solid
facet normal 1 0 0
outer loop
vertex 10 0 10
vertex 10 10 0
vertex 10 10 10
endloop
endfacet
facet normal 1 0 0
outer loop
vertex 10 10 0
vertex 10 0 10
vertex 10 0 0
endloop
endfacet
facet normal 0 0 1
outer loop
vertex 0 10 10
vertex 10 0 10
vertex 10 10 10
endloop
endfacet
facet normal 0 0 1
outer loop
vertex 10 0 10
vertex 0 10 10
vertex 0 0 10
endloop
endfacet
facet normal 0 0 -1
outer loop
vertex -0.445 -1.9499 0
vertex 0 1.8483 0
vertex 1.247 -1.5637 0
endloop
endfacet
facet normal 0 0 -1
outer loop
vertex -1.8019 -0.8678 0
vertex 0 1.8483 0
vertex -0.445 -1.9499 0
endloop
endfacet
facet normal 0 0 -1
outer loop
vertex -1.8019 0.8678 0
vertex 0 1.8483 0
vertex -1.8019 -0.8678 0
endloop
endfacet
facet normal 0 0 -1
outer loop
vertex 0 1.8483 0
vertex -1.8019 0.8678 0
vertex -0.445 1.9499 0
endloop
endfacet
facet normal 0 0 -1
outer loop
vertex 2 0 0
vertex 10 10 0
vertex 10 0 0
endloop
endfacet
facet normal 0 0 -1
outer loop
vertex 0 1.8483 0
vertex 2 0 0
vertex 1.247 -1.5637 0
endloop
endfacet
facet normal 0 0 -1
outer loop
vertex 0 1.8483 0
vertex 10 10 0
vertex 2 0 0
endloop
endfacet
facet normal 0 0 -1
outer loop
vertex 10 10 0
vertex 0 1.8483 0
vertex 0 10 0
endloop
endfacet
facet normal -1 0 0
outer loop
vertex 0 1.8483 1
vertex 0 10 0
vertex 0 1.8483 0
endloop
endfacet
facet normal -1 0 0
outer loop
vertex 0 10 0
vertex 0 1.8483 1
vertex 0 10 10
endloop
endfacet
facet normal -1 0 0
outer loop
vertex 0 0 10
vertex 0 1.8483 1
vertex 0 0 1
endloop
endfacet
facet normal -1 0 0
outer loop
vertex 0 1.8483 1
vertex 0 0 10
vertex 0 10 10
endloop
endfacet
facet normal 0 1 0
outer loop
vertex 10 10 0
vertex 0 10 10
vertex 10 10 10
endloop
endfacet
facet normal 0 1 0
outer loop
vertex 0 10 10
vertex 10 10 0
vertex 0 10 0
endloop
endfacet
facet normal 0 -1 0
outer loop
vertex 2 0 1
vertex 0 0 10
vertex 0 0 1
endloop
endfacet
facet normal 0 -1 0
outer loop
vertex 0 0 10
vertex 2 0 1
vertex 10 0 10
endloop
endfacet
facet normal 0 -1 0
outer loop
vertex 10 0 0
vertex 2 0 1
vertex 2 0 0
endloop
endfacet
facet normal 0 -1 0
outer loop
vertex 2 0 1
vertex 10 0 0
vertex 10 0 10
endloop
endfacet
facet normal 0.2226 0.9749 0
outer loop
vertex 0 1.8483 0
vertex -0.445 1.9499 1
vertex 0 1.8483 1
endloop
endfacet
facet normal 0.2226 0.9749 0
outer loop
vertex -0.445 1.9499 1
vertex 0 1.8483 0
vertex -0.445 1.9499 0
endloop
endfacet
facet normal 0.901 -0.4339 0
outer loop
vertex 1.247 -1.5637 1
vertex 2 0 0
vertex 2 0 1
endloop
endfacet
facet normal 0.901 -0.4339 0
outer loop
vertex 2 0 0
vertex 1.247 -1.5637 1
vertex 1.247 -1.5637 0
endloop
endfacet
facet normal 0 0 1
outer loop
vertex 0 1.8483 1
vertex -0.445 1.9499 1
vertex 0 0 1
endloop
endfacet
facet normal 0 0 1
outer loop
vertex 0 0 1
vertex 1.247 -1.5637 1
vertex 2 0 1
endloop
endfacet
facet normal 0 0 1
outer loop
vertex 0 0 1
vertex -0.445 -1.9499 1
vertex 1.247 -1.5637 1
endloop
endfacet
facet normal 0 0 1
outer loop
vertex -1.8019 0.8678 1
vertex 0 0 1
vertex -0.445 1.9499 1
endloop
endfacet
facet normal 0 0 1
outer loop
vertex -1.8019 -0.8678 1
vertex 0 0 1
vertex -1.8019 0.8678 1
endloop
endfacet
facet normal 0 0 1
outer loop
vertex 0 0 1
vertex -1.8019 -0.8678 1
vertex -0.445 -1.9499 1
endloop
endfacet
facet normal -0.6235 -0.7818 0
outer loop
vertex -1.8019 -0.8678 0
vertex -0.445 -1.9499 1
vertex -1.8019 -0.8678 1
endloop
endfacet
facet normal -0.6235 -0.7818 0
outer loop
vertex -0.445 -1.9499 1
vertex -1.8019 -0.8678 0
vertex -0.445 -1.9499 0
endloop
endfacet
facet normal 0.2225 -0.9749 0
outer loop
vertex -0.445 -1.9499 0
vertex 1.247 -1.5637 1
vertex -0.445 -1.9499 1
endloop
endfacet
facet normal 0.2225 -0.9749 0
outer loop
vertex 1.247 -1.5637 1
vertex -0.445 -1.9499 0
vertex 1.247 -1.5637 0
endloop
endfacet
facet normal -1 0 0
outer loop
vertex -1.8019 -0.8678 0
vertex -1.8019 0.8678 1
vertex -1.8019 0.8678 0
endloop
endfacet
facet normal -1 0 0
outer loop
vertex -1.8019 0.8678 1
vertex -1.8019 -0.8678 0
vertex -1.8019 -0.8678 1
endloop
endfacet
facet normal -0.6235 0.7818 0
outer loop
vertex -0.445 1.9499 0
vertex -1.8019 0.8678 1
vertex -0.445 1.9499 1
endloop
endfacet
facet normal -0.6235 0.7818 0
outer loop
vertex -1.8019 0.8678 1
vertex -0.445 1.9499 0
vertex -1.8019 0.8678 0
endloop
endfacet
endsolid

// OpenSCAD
// Widget v1 - (c) 2026 Root Author, CC-BY-4.0
// ======== file headers & licenses aggregated by ScadBundler ========
// -------- include <a.scad> --------
// a.scad - MIT License
// -------- include <common.scad> --------
// common.scad - CC0 Public Domain
// -------- include <b.scad> --------
// b.scad - Apache-2.0
// -------- use <gears.scad> --------
// gears.scad - GPL-3.0
// ====================================================================
/* [Size] */
width = 10;  // [1:100]

// ======== use <gears.scad> ========
module gears__gear() cylinder(h = 1, r = 2);

// ======== include <common.scad> ========
module frame(w) cube(w);

// ======== include <a.scad> ========
module widget(w) frame(w);

// ======== include <b.scad> ========
module bracket() frame(2);

// ======== main.scad (continued) ========
widget(width);
bracket();
gears__gear();
